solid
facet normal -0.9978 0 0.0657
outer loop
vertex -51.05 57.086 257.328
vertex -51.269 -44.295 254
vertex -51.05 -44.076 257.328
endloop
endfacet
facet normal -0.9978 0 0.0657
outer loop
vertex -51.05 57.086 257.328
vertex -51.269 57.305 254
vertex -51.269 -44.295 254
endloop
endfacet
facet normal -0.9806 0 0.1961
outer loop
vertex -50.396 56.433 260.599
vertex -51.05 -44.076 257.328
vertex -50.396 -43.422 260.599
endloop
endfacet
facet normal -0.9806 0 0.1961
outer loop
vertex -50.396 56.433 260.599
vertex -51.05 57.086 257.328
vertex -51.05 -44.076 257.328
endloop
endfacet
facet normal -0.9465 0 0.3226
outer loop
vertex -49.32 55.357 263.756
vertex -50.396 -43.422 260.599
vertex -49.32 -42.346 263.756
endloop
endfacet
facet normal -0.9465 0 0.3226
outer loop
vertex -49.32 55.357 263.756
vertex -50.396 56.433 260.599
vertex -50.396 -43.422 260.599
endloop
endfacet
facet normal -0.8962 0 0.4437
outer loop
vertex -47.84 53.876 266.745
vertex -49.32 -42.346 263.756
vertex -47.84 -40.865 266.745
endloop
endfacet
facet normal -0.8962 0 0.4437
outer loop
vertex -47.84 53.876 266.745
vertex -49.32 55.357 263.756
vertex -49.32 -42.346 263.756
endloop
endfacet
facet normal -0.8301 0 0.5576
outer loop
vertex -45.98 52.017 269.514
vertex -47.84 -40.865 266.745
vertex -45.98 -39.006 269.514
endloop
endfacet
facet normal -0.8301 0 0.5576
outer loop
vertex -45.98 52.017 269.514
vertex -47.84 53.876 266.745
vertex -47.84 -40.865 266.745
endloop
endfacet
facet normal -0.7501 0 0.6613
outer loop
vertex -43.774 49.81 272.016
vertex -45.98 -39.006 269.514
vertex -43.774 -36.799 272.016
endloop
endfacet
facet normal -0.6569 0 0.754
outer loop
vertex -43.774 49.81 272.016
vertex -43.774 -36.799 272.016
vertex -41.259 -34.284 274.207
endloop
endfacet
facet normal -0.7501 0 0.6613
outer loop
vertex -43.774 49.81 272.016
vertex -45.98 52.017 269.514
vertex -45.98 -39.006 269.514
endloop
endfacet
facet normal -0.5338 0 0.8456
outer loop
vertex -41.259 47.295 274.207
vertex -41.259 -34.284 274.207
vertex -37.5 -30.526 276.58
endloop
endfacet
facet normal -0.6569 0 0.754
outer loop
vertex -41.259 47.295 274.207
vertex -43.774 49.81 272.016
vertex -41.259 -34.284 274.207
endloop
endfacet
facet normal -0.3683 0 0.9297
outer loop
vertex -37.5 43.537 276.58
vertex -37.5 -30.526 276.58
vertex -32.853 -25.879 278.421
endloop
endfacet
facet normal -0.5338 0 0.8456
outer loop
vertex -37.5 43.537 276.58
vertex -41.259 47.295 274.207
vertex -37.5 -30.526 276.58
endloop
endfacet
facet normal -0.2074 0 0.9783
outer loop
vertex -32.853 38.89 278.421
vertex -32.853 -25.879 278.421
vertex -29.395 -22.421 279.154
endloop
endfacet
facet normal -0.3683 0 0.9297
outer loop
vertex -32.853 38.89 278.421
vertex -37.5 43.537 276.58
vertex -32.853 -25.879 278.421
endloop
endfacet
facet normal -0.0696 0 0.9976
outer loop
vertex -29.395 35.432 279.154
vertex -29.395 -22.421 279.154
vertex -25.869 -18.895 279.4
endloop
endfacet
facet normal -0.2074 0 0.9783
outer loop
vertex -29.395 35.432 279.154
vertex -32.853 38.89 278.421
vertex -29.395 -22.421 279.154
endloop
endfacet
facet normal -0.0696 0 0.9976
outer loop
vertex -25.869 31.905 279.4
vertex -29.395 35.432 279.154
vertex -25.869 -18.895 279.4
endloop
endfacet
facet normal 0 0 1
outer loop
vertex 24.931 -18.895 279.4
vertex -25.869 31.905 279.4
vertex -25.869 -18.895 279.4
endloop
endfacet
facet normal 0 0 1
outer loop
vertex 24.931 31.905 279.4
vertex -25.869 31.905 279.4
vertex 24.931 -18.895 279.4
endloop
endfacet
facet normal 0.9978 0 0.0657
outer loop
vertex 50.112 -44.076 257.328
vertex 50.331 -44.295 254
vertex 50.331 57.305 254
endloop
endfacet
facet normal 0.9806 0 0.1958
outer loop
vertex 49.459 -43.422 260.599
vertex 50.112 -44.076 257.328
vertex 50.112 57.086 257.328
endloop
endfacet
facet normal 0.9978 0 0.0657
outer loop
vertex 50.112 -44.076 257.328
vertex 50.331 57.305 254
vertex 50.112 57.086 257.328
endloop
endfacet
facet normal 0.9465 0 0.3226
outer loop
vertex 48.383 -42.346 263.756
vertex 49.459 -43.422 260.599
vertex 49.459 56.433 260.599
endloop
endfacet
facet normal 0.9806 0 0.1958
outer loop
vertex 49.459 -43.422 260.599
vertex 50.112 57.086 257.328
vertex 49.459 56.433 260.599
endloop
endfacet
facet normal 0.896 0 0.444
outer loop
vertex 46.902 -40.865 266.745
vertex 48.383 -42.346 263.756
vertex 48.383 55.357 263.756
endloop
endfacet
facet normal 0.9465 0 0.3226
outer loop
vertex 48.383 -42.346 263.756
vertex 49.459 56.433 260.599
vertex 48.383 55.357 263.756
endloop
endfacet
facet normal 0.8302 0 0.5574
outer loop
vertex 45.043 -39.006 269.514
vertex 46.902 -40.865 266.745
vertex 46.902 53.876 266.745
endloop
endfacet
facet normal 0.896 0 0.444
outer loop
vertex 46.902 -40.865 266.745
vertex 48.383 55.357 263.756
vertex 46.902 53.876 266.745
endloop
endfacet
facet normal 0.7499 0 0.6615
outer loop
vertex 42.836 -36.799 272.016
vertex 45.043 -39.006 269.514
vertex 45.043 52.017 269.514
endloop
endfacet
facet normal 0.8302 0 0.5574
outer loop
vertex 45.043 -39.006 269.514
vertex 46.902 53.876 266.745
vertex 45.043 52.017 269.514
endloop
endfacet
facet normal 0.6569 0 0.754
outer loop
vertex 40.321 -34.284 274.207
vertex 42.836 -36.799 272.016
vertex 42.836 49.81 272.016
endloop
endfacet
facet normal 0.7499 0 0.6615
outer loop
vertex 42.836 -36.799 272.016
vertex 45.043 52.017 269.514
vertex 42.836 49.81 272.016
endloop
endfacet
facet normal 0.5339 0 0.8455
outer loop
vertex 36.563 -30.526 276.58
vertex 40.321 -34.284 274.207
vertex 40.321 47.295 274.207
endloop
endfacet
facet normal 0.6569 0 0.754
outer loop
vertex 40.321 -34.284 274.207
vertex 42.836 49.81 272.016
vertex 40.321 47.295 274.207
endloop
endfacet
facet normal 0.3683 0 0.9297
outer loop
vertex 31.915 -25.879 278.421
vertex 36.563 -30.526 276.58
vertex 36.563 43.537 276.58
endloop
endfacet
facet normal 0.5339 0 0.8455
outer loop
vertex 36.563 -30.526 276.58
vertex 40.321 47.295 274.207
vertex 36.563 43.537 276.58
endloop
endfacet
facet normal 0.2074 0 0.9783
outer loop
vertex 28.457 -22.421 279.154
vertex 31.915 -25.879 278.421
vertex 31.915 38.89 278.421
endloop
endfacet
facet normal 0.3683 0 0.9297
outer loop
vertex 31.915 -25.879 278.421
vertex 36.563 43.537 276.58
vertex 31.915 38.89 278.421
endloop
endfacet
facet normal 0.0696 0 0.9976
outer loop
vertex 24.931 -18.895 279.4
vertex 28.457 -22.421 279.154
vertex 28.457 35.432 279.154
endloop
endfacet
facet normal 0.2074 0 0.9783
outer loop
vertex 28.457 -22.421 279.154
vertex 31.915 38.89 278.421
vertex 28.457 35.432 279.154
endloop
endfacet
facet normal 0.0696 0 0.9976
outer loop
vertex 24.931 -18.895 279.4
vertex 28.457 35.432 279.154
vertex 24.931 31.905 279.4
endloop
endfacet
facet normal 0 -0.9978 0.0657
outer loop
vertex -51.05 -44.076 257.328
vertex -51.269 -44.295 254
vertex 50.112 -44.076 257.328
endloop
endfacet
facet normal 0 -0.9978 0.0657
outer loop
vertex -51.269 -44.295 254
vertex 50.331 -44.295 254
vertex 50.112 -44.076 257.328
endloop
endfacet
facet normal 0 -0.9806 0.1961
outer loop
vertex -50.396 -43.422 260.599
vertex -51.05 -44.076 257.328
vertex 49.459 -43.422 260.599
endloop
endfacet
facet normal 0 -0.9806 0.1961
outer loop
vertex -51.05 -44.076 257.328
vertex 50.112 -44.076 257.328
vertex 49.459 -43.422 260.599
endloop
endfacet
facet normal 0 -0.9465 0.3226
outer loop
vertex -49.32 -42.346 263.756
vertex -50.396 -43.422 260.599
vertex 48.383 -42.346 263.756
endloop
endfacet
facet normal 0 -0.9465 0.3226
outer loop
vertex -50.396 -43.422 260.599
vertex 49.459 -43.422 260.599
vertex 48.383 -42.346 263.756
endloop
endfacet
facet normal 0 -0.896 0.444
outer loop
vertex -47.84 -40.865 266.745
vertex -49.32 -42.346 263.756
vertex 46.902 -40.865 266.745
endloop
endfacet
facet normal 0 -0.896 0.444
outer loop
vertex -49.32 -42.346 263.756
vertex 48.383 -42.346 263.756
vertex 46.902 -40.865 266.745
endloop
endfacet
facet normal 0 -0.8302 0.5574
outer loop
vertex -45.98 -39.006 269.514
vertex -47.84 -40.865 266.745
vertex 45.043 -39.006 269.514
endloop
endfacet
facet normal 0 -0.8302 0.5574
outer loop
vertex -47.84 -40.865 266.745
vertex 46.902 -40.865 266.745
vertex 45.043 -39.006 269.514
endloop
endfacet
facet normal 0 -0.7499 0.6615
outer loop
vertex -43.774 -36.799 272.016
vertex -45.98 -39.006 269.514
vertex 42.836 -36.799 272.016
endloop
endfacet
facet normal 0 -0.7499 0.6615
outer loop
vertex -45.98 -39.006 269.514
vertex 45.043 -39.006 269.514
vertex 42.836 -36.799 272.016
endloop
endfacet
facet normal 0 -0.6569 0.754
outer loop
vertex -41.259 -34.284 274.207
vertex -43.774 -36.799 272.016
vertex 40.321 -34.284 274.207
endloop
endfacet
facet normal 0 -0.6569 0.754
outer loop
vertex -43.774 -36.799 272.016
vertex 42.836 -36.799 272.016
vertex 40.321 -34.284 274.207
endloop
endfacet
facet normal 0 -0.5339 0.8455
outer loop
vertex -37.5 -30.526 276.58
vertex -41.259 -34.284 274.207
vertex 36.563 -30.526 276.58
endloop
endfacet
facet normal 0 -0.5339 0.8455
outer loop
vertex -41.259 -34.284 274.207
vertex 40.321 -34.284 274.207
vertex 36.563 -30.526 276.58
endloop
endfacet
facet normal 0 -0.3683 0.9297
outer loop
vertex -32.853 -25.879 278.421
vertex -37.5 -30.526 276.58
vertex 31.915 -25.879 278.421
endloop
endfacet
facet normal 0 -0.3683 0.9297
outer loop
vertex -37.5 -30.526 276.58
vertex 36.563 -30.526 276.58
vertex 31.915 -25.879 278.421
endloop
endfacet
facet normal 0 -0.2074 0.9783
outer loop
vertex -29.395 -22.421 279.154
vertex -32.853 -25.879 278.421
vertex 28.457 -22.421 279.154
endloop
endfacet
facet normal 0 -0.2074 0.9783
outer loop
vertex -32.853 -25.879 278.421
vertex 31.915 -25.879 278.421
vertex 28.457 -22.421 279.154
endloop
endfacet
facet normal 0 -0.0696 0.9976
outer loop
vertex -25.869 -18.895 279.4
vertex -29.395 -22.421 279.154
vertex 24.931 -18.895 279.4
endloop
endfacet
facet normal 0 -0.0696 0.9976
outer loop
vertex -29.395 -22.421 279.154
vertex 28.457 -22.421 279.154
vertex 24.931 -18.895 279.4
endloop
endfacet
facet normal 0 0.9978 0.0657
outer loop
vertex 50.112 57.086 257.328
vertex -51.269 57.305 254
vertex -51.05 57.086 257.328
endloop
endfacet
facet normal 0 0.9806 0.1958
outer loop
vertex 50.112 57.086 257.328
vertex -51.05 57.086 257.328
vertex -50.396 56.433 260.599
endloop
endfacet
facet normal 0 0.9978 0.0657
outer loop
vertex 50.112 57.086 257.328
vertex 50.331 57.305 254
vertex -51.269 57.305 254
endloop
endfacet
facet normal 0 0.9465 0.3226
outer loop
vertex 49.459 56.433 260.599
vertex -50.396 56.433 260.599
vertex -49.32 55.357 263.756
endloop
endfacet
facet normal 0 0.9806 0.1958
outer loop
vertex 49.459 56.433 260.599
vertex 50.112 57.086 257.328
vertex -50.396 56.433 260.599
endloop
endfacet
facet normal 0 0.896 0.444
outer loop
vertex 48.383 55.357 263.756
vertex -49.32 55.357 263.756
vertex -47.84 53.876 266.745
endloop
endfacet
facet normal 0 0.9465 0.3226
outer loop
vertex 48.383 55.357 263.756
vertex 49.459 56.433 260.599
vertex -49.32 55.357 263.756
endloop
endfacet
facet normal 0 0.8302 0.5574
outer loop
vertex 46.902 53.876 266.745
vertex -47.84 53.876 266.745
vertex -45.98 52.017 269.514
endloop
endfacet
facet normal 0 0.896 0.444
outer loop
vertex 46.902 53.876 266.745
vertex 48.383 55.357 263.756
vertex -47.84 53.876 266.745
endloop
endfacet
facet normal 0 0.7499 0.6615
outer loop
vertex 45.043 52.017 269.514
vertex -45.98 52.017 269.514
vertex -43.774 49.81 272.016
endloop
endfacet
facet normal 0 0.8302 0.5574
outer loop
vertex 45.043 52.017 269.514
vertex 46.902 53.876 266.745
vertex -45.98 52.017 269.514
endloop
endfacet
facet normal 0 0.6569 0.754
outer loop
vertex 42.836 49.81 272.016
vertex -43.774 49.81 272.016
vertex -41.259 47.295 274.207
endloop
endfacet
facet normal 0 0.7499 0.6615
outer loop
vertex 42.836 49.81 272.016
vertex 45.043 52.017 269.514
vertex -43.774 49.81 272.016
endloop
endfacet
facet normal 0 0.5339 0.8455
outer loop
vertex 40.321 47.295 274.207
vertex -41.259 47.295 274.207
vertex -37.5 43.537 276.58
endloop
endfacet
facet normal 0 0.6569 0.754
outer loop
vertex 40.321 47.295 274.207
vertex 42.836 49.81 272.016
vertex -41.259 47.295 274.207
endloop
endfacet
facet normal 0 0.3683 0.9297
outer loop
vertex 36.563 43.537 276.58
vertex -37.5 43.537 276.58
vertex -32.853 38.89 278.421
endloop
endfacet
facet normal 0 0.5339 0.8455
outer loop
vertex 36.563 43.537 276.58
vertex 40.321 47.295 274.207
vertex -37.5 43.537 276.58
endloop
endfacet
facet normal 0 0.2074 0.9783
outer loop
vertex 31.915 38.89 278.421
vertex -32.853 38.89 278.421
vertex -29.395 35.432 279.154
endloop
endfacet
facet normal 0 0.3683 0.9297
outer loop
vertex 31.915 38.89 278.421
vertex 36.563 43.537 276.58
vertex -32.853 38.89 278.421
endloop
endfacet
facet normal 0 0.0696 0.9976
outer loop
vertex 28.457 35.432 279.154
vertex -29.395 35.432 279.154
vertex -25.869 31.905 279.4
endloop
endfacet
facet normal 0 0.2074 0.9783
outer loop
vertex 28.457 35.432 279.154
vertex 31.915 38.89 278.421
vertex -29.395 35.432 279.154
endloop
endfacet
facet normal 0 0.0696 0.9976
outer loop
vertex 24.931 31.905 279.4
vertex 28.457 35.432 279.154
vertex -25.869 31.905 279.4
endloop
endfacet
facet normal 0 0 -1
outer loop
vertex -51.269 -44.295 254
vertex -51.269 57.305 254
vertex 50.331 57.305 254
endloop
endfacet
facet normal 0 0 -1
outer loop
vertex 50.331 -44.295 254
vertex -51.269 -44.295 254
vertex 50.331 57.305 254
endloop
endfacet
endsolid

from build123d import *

# Parameters (mm, degrees)
F3_W     = 50.7285948843
F3_H     = 69.9163675308
F6_W     = 101.6
F6_H     = 101.6
F7_DEPTH = 25.4
F8_R     = 25.39999


# Not quite as in the source:
# - a fillet or chamfer is up to 0.001 mm smaller than in the source, because OpenCascade refuses the exact size


with BuildPart() as f4:
    # F1 (on offset) → F4 section 0
    with BuildSketch(Plane.YZ.offset(127)):
        with BuildLine():
            add(Edge.make_bspline(
                [(-11.8536790833, -25.3428127617), (16.5973998136, -117.2622232897), (89.6947664905, -44.2741583201), (162.7921331674, 28.7139066495), (61.2436875936, 47.6452522079), (-40.3047579802, 66.5765977664), (-11.8536790833, -25.3428127617)],
                knots=[0, 0, 0, 2.0943951024, 2.0943951024, 4.1887902048, 4.1887902048, 6.2831853072, 6.2831853072, 6.2831853072], degree=2, weights=[1, 0.5, 1, 0.5, 1, 0.5, 1]))
        make_face()
    # F3 (on offset) → F4 section 1
    with BuildSketch(Plane.XY.offset(254)):
        with Locations((-8.5154855624, -1.6246475279)):
            Rectangle(F3_W, F3_H)
    loft()


with BuildPart() as f7:
    # F6 (on offset) → F7 (new body)
    with BuildSketch(Plane.XY.offset(254)):
        with Locations((-0.4687514156, 6.5054772415)):
            Rectangle(F6_W, F6_H)
    extrude(amount=F7_DEPTH)

    # F8 (radius 25.4 in the source; OpenCascade refuses exactly that, so slightly less here)
    f8_edges = [f7.edges().sort_by_distance(p)[0] for p in [
        (50.331249, 6.505477, 279.4),
        (-0.468751, 57.305477, 279.4),
        (-51.268751, 6.505477, 279.4),
        (-0.468751, -44.294523, 279.4),
    ]]
    fillet(f8_edges, radius=F8_R)


solid = f7.part
